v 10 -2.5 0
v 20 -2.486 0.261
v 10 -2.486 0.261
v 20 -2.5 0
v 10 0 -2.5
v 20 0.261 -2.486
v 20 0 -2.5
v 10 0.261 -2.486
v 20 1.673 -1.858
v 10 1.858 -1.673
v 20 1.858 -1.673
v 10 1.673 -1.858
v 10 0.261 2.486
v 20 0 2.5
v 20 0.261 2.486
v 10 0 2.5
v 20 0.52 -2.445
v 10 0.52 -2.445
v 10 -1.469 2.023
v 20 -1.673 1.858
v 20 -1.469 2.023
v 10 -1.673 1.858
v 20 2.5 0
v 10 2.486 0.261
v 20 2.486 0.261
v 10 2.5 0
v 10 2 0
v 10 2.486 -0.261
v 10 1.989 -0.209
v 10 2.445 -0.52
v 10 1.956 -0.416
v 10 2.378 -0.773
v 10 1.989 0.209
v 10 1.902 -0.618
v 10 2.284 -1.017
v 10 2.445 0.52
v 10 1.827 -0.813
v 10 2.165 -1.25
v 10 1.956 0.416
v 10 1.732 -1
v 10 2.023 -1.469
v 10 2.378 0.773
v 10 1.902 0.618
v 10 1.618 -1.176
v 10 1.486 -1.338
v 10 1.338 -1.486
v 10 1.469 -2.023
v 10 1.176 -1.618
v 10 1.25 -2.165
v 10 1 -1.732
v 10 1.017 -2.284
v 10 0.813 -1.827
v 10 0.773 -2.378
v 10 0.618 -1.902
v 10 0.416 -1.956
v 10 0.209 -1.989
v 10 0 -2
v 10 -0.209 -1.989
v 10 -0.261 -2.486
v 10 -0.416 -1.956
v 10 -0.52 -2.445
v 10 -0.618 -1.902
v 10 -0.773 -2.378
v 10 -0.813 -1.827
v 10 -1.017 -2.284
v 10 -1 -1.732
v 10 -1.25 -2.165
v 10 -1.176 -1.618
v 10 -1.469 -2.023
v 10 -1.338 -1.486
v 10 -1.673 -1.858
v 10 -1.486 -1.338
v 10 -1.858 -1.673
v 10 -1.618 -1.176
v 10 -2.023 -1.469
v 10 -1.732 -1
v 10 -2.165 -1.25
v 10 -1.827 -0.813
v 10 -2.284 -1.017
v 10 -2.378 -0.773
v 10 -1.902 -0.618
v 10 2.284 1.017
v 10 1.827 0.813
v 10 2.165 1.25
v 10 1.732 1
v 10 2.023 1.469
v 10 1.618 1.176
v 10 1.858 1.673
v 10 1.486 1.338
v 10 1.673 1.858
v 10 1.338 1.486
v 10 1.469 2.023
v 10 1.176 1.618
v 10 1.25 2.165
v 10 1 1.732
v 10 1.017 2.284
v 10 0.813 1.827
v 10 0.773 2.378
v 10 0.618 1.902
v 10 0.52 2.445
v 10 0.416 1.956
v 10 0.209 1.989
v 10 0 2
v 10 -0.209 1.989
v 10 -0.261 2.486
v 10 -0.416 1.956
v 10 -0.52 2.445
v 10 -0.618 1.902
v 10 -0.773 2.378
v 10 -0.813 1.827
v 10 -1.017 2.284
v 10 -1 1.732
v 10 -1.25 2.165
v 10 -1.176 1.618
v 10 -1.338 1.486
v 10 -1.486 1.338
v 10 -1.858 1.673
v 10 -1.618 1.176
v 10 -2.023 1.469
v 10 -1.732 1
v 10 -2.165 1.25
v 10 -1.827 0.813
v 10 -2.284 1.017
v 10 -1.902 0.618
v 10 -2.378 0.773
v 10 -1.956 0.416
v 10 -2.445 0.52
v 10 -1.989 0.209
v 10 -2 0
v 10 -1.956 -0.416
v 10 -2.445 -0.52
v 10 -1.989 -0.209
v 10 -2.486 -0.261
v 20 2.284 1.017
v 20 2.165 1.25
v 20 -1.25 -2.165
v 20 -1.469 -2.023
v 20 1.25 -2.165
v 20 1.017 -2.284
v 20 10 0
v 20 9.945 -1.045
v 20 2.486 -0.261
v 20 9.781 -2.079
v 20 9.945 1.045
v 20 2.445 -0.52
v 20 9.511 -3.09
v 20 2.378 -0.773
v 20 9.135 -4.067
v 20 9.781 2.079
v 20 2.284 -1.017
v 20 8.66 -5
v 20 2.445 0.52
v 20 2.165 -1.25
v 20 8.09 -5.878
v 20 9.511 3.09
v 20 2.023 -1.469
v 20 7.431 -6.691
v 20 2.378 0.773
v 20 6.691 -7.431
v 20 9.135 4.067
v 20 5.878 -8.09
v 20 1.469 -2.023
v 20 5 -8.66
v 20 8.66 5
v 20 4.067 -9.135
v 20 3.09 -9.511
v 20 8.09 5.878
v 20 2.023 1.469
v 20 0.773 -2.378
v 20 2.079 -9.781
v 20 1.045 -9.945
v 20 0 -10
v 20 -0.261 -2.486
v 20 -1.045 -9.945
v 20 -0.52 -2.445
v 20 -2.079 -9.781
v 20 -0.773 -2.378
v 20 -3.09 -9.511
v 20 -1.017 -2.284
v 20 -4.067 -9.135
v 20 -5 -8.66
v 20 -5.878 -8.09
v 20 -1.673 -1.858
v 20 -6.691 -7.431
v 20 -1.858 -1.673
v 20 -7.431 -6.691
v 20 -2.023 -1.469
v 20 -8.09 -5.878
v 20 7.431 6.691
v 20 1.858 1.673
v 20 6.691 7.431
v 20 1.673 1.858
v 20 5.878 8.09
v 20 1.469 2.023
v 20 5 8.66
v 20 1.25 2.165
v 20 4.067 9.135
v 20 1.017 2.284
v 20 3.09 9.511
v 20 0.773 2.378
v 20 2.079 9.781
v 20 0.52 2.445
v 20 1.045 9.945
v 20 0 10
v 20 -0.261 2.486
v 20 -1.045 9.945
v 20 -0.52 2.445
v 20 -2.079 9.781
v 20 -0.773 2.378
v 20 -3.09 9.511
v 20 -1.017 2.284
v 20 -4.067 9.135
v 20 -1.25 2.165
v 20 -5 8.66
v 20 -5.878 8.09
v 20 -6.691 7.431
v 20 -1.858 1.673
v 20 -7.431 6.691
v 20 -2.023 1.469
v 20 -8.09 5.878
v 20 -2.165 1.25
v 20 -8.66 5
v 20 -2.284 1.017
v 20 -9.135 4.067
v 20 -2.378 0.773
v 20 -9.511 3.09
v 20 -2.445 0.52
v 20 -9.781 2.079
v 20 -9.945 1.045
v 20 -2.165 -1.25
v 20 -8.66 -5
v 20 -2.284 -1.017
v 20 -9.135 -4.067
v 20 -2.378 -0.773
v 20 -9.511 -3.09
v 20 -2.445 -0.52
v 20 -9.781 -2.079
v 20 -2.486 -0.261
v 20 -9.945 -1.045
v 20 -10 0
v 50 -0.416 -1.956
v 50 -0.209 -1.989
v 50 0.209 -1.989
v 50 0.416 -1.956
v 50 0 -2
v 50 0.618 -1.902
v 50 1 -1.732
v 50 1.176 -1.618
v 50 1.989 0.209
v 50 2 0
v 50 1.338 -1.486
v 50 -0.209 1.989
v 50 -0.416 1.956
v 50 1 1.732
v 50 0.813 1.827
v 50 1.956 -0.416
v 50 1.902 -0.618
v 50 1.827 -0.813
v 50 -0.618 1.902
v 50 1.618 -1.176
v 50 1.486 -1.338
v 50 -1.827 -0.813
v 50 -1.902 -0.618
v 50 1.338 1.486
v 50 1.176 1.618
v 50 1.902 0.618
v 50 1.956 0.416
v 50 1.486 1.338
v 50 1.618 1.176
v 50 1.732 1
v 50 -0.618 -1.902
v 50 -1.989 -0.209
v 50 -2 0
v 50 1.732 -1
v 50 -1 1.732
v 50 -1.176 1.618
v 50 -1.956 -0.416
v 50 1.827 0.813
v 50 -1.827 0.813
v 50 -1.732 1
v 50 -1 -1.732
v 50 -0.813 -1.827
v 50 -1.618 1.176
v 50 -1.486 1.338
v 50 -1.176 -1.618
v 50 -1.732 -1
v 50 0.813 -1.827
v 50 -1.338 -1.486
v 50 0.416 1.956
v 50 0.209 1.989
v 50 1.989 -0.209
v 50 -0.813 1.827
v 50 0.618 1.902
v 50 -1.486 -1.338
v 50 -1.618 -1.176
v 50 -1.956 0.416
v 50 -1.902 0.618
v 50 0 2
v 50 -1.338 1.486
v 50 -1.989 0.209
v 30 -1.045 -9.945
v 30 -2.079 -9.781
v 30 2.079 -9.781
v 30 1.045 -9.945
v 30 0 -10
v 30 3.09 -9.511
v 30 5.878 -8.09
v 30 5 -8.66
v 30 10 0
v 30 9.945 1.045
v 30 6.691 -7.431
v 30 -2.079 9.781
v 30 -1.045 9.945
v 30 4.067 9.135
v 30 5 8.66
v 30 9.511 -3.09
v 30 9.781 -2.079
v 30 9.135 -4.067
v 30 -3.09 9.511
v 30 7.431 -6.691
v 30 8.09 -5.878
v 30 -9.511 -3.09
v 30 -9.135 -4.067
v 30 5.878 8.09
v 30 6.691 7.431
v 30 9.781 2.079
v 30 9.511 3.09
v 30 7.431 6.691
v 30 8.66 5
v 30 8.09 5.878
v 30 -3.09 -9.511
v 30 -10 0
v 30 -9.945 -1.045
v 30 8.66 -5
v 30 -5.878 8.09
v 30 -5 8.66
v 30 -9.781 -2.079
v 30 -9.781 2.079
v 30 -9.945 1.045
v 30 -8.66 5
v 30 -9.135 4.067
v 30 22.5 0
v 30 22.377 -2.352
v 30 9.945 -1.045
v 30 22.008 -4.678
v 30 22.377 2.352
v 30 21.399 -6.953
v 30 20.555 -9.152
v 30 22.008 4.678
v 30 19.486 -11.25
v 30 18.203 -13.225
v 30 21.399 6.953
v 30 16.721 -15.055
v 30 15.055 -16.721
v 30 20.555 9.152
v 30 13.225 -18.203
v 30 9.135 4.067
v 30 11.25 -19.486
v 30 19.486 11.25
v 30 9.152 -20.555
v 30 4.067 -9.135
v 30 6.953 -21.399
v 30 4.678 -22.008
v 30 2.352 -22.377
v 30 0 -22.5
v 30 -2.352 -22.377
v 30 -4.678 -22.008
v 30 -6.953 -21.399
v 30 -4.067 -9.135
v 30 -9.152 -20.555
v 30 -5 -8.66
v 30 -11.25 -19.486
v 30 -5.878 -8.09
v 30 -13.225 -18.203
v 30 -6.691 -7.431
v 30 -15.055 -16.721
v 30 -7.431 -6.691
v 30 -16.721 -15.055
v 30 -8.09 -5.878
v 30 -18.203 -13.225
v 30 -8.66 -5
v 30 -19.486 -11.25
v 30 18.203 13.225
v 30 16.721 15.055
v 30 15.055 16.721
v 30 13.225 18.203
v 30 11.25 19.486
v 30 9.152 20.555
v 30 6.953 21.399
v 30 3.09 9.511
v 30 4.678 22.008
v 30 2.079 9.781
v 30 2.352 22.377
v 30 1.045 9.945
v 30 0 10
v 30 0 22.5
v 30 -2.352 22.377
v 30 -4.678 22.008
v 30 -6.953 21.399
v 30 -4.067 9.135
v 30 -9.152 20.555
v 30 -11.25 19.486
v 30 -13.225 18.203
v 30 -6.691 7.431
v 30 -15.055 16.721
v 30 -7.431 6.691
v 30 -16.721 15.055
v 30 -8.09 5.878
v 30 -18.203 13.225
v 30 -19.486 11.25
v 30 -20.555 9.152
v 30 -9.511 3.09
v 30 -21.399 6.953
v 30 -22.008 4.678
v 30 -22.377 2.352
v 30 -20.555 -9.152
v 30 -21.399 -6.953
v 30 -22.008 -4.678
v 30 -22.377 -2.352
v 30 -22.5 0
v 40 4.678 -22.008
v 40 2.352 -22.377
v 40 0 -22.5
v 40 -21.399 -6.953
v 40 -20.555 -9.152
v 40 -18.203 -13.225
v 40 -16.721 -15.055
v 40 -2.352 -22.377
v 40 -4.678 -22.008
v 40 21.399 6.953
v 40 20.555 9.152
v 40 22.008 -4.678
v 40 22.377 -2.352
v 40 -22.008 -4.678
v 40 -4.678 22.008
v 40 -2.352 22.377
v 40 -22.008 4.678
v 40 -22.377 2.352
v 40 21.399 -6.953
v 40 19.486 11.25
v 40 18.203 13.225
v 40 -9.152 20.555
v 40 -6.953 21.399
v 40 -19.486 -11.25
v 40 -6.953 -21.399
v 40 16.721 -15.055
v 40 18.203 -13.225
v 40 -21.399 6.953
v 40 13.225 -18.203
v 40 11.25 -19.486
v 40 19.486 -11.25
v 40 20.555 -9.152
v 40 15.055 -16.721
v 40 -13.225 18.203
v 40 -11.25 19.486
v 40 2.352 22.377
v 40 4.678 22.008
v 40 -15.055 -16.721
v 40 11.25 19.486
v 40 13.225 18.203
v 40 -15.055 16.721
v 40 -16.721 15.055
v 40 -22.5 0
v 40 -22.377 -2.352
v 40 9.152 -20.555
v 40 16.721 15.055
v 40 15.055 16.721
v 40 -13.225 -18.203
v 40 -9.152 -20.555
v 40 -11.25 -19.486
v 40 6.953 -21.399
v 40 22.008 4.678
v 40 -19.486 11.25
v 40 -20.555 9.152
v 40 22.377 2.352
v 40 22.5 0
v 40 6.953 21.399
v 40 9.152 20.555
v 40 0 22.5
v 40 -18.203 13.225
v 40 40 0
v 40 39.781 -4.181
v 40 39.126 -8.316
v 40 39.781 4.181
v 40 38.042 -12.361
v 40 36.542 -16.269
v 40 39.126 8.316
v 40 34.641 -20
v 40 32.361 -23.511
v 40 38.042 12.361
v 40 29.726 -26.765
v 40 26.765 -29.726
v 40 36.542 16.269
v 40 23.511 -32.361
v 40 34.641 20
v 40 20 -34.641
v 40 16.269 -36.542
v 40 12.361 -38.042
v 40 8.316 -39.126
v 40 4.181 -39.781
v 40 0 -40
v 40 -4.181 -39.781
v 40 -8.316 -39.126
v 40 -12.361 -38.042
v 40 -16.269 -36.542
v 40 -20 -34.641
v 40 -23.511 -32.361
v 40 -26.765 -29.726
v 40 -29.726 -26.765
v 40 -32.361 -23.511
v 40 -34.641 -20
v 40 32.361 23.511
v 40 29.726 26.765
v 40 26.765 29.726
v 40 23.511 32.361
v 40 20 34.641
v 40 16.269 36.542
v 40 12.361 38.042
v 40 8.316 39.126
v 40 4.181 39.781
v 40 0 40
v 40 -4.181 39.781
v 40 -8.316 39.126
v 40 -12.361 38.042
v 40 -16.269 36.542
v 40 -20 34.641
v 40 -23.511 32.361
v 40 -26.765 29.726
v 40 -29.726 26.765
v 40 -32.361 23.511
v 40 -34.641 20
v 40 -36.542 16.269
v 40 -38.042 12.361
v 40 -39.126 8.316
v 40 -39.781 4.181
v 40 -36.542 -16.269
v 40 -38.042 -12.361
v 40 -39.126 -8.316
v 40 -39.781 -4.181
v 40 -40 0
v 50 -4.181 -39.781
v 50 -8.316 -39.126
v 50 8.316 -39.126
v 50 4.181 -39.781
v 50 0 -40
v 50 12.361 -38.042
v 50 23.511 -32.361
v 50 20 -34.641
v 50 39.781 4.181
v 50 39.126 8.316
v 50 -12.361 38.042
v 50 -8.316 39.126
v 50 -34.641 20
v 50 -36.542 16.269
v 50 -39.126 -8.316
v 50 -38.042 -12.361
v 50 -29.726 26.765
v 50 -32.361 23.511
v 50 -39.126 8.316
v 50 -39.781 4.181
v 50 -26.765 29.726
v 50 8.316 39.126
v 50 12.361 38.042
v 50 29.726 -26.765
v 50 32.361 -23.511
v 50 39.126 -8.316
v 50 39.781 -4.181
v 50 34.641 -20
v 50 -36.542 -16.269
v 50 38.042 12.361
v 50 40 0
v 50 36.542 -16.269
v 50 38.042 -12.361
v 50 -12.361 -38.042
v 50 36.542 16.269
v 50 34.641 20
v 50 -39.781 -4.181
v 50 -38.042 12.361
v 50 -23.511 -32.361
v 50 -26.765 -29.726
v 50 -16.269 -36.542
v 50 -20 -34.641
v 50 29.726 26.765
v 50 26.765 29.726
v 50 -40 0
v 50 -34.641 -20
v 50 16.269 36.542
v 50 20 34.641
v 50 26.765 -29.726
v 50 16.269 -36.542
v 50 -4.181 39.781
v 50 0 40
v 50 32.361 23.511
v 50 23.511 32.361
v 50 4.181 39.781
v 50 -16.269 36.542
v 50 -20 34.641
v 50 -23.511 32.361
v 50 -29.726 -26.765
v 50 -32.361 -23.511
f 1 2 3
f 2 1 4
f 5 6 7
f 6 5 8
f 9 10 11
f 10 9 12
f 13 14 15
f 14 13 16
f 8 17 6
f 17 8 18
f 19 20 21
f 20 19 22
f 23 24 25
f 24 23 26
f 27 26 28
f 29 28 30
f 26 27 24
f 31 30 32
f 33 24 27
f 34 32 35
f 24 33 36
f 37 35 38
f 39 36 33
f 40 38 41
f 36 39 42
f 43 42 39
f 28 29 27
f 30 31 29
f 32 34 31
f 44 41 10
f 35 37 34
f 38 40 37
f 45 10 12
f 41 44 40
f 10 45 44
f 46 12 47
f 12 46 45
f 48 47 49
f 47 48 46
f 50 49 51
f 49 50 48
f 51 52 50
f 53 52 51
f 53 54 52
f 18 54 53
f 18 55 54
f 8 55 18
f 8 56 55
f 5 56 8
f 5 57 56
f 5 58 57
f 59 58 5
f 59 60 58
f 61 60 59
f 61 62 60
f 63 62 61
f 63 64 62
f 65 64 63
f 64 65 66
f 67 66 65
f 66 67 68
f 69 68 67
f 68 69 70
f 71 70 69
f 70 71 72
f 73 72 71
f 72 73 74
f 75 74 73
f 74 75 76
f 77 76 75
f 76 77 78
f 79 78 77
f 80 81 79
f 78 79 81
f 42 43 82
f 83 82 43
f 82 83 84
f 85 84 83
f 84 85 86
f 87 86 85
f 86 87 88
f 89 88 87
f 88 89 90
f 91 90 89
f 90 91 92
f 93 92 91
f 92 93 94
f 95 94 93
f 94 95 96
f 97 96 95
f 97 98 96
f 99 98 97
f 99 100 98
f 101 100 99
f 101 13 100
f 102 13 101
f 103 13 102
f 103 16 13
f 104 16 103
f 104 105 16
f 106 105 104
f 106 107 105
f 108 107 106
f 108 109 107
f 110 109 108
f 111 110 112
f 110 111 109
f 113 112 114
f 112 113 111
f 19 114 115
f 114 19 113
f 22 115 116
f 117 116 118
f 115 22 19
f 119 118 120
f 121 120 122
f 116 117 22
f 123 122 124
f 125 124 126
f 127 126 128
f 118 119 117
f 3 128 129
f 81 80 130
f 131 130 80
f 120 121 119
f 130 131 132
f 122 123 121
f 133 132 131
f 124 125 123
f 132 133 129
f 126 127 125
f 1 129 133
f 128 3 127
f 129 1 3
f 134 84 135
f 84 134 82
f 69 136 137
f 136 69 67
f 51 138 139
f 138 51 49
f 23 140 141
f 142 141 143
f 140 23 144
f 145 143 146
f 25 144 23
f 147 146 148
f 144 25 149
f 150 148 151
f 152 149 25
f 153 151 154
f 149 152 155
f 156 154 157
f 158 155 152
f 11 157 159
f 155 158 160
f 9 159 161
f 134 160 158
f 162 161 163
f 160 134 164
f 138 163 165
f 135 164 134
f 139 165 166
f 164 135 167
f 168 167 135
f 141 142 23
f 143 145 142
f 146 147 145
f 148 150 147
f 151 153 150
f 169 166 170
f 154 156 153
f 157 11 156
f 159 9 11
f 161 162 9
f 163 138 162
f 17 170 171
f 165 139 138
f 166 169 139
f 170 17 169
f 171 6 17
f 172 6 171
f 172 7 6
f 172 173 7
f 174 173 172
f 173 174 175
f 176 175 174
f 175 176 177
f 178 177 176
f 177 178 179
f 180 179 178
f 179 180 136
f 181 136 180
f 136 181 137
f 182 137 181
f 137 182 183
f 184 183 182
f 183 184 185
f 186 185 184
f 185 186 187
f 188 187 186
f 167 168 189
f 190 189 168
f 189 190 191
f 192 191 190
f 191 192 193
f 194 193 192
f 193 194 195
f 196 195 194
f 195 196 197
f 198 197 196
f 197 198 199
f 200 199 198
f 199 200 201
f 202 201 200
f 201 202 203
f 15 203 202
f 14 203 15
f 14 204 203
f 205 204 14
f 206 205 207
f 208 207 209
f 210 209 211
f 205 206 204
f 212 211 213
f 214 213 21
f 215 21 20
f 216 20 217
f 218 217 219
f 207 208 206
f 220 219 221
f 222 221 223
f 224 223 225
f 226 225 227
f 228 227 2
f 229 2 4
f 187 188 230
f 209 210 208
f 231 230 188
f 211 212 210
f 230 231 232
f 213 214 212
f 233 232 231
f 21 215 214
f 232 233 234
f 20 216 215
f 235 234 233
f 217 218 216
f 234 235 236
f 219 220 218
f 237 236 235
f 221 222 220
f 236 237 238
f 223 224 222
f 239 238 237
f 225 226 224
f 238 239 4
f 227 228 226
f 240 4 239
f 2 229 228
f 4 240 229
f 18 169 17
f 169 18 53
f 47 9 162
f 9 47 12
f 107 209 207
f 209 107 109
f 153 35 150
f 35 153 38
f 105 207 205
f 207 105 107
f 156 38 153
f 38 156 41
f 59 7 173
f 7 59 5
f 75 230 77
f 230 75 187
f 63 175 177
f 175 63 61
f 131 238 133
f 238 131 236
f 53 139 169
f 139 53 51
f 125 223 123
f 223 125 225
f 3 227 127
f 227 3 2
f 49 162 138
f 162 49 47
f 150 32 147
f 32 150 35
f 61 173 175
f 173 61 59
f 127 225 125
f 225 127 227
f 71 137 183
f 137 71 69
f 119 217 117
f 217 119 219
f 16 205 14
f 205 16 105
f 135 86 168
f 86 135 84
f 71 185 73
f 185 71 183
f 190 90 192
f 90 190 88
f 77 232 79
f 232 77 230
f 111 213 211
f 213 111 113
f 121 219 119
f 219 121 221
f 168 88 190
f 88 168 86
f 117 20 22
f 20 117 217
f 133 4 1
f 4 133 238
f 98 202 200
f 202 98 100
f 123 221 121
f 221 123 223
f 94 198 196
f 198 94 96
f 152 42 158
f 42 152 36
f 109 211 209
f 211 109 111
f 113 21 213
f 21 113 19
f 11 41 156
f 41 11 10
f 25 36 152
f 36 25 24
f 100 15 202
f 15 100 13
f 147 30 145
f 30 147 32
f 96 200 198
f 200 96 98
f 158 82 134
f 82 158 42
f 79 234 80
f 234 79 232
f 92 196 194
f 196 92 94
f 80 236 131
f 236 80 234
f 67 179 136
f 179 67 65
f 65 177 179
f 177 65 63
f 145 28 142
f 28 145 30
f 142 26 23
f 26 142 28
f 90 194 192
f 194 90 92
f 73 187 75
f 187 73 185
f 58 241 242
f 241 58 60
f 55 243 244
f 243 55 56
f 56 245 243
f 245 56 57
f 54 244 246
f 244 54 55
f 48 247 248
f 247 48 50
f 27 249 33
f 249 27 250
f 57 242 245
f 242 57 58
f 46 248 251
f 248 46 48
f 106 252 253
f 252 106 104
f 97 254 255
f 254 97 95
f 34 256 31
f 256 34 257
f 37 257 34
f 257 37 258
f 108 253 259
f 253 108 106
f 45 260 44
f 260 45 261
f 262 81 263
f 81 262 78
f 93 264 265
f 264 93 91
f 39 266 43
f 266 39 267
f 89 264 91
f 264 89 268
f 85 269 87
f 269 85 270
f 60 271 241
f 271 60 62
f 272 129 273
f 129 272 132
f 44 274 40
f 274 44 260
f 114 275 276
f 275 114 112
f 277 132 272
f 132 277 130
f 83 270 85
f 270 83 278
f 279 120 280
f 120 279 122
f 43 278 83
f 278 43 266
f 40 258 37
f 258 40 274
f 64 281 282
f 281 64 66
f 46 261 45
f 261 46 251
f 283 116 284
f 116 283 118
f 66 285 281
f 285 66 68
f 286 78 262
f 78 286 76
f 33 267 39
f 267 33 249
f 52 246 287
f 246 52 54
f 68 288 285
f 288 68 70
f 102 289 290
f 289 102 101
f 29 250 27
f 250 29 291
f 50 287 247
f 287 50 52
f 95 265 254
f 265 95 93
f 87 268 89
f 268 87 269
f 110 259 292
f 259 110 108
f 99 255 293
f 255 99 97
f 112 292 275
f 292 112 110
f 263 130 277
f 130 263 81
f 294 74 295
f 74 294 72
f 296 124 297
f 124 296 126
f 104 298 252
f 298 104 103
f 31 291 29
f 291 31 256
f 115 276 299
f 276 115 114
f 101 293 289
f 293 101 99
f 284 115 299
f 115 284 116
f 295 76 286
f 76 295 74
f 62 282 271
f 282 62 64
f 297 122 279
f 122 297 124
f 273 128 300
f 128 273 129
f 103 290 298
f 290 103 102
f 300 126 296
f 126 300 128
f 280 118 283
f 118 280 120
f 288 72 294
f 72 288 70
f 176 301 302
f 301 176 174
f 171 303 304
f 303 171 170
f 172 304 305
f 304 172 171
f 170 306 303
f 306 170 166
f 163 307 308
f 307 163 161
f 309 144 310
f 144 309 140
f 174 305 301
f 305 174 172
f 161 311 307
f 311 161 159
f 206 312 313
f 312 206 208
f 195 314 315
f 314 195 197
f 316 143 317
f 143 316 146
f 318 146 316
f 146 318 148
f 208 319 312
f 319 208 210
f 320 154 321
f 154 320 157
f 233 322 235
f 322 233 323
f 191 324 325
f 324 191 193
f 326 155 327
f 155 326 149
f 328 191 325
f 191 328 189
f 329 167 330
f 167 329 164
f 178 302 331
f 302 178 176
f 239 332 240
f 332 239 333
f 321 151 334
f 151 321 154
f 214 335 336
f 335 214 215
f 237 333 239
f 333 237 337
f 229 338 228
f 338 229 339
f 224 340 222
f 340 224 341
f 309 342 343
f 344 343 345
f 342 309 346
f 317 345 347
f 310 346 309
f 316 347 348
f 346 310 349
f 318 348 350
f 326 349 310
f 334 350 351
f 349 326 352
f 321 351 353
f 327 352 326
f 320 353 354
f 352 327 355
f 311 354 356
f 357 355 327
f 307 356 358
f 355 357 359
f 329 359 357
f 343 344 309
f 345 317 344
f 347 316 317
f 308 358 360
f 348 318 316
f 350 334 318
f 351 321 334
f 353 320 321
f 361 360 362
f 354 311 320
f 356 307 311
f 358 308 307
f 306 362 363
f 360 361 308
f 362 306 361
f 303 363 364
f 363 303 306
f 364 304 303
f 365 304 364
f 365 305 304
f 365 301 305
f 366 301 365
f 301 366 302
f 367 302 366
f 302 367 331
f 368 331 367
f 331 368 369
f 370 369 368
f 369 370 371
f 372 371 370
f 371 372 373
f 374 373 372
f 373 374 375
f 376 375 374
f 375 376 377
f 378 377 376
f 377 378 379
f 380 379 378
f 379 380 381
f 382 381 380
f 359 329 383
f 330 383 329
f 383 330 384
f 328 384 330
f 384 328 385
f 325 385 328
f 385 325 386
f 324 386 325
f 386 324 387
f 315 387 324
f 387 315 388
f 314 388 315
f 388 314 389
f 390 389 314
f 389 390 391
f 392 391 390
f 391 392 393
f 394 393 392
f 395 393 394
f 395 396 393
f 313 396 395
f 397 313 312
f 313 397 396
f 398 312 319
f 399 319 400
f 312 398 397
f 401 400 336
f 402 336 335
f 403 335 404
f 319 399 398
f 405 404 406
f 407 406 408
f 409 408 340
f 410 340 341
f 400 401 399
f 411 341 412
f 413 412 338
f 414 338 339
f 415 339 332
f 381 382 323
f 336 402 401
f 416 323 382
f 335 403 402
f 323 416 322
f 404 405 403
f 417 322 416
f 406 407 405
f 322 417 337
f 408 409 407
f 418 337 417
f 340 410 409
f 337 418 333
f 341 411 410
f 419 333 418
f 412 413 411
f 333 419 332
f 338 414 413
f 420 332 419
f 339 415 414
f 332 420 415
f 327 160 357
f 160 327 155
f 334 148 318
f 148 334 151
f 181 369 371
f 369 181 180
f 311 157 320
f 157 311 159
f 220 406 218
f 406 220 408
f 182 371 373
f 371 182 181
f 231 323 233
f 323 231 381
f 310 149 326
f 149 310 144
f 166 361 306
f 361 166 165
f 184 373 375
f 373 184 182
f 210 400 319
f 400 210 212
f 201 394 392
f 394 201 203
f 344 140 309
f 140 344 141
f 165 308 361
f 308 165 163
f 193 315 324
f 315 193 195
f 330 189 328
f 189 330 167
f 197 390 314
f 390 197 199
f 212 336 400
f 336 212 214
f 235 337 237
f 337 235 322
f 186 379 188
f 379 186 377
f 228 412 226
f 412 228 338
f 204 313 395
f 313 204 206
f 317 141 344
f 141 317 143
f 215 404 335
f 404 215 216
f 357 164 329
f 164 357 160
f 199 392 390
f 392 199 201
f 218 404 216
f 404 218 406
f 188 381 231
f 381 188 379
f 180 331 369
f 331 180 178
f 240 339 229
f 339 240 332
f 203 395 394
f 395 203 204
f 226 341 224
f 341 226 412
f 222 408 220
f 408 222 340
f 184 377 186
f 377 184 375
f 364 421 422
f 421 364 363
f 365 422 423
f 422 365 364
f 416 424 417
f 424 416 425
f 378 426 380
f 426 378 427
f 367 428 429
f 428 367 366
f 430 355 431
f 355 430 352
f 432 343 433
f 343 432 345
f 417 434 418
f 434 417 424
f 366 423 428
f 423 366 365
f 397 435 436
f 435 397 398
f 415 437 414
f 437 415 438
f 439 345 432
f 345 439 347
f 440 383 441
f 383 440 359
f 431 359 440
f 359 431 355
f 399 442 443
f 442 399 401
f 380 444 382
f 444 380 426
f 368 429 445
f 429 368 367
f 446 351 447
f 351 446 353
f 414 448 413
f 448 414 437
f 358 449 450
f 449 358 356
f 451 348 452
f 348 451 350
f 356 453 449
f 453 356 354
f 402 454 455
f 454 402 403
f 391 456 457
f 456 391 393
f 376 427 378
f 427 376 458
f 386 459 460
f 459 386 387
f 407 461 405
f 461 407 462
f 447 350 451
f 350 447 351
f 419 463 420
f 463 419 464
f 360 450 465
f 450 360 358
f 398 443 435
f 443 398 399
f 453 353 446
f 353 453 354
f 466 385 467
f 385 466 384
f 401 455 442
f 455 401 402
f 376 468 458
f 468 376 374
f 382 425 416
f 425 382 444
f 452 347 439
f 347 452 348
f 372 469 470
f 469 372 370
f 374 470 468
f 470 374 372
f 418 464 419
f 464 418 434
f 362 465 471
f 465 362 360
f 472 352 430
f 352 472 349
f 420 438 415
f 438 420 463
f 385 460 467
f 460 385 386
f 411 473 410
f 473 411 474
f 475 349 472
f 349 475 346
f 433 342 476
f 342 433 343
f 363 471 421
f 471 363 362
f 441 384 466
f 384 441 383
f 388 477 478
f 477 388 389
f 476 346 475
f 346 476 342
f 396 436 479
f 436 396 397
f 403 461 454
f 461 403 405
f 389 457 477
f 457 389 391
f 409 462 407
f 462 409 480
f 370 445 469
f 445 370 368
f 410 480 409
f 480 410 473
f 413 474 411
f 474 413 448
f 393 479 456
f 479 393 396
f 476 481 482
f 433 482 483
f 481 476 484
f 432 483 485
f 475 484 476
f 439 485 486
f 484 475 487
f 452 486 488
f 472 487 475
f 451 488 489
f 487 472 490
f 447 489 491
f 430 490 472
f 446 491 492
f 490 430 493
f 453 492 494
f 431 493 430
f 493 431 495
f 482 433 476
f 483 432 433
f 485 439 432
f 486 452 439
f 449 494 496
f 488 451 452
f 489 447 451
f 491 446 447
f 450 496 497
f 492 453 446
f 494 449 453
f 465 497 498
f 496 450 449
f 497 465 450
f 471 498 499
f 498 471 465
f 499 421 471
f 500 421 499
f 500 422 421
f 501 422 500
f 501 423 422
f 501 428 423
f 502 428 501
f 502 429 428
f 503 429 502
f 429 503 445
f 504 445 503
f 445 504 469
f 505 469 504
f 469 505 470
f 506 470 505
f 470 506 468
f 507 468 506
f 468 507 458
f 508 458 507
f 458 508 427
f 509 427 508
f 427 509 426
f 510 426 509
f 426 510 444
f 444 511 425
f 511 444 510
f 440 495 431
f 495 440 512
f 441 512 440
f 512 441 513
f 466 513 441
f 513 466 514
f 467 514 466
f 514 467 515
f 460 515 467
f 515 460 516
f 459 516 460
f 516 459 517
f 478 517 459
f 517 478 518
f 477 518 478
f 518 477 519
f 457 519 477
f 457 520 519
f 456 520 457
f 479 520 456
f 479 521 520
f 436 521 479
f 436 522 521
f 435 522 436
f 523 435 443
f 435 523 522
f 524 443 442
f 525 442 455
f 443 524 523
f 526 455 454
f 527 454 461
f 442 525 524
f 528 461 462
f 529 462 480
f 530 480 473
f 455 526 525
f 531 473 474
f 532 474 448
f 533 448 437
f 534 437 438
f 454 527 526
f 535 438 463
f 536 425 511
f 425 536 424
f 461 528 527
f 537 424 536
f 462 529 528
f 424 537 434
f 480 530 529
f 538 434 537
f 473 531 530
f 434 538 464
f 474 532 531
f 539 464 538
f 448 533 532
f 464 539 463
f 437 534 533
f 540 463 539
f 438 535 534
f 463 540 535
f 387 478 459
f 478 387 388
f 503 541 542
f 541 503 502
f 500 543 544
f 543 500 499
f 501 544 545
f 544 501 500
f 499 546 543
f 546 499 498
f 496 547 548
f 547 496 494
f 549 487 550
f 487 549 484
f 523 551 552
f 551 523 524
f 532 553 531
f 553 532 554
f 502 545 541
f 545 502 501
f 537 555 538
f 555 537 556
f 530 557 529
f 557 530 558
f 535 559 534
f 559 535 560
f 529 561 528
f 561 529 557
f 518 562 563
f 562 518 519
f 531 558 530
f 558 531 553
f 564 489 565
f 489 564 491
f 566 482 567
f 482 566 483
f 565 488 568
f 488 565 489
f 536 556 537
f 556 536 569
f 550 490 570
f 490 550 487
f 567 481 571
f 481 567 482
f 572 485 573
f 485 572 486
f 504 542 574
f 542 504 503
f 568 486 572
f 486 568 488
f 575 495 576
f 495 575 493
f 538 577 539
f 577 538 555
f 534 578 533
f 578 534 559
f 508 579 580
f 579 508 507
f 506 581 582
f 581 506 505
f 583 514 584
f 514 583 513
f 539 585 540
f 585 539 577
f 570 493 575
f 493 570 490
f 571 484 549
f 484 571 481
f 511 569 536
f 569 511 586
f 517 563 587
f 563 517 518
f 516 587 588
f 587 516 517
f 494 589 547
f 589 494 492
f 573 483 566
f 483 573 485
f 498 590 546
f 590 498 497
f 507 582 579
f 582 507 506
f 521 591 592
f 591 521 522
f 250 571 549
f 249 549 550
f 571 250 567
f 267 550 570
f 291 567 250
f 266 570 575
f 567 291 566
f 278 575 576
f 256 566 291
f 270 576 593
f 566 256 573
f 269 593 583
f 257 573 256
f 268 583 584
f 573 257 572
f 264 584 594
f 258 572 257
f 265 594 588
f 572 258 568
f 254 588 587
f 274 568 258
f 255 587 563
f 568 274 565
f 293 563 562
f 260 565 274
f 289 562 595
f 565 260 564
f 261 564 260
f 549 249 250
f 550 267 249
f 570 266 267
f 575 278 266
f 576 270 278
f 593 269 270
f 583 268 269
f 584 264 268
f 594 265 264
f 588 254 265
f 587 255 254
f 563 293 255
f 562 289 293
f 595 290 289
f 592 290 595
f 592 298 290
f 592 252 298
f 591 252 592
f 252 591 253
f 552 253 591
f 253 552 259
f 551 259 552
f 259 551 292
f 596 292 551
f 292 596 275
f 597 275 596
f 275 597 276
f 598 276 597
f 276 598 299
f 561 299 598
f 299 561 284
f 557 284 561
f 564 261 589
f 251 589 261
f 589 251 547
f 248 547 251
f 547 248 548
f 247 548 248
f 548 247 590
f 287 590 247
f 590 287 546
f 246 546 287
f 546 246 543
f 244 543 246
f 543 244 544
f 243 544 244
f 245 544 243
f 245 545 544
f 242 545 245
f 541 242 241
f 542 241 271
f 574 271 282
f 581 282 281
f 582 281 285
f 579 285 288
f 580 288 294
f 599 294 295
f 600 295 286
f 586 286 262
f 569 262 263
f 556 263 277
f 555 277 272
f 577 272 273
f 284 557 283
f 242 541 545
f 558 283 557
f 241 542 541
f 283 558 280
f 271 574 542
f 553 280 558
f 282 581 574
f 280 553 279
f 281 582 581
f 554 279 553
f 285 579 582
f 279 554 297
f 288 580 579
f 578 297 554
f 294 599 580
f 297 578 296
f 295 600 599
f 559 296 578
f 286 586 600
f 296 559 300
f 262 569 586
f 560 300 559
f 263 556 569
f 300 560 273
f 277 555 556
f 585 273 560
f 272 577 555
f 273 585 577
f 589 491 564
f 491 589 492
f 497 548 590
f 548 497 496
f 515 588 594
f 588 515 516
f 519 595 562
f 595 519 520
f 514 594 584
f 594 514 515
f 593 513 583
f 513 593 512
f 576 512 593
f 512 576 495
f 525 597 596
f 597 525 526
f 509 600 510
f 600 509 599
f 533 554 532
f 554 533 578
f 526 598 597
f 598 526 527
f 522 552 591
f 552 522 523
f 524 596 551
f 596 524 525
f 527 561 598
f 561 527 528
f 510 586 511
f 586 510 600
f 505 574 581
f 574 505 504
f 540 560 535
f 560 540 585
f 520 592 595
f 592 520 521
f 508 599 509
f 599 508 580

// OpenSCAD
dx=10;

scale=10;
$fn=60;

n=round(4/(dx/scale));
echo (n);
for (i=[0:1:n]){
    x=i*dx/scale;
    echo(x);
    translate ([i*dx,0,0])
    rotate ([0,90,0])
    difference(){
        cylinder (h=dx,r=((.25)*(x^2))*scale);
        cylinder (h=dx,r=2);
    }
    
}
